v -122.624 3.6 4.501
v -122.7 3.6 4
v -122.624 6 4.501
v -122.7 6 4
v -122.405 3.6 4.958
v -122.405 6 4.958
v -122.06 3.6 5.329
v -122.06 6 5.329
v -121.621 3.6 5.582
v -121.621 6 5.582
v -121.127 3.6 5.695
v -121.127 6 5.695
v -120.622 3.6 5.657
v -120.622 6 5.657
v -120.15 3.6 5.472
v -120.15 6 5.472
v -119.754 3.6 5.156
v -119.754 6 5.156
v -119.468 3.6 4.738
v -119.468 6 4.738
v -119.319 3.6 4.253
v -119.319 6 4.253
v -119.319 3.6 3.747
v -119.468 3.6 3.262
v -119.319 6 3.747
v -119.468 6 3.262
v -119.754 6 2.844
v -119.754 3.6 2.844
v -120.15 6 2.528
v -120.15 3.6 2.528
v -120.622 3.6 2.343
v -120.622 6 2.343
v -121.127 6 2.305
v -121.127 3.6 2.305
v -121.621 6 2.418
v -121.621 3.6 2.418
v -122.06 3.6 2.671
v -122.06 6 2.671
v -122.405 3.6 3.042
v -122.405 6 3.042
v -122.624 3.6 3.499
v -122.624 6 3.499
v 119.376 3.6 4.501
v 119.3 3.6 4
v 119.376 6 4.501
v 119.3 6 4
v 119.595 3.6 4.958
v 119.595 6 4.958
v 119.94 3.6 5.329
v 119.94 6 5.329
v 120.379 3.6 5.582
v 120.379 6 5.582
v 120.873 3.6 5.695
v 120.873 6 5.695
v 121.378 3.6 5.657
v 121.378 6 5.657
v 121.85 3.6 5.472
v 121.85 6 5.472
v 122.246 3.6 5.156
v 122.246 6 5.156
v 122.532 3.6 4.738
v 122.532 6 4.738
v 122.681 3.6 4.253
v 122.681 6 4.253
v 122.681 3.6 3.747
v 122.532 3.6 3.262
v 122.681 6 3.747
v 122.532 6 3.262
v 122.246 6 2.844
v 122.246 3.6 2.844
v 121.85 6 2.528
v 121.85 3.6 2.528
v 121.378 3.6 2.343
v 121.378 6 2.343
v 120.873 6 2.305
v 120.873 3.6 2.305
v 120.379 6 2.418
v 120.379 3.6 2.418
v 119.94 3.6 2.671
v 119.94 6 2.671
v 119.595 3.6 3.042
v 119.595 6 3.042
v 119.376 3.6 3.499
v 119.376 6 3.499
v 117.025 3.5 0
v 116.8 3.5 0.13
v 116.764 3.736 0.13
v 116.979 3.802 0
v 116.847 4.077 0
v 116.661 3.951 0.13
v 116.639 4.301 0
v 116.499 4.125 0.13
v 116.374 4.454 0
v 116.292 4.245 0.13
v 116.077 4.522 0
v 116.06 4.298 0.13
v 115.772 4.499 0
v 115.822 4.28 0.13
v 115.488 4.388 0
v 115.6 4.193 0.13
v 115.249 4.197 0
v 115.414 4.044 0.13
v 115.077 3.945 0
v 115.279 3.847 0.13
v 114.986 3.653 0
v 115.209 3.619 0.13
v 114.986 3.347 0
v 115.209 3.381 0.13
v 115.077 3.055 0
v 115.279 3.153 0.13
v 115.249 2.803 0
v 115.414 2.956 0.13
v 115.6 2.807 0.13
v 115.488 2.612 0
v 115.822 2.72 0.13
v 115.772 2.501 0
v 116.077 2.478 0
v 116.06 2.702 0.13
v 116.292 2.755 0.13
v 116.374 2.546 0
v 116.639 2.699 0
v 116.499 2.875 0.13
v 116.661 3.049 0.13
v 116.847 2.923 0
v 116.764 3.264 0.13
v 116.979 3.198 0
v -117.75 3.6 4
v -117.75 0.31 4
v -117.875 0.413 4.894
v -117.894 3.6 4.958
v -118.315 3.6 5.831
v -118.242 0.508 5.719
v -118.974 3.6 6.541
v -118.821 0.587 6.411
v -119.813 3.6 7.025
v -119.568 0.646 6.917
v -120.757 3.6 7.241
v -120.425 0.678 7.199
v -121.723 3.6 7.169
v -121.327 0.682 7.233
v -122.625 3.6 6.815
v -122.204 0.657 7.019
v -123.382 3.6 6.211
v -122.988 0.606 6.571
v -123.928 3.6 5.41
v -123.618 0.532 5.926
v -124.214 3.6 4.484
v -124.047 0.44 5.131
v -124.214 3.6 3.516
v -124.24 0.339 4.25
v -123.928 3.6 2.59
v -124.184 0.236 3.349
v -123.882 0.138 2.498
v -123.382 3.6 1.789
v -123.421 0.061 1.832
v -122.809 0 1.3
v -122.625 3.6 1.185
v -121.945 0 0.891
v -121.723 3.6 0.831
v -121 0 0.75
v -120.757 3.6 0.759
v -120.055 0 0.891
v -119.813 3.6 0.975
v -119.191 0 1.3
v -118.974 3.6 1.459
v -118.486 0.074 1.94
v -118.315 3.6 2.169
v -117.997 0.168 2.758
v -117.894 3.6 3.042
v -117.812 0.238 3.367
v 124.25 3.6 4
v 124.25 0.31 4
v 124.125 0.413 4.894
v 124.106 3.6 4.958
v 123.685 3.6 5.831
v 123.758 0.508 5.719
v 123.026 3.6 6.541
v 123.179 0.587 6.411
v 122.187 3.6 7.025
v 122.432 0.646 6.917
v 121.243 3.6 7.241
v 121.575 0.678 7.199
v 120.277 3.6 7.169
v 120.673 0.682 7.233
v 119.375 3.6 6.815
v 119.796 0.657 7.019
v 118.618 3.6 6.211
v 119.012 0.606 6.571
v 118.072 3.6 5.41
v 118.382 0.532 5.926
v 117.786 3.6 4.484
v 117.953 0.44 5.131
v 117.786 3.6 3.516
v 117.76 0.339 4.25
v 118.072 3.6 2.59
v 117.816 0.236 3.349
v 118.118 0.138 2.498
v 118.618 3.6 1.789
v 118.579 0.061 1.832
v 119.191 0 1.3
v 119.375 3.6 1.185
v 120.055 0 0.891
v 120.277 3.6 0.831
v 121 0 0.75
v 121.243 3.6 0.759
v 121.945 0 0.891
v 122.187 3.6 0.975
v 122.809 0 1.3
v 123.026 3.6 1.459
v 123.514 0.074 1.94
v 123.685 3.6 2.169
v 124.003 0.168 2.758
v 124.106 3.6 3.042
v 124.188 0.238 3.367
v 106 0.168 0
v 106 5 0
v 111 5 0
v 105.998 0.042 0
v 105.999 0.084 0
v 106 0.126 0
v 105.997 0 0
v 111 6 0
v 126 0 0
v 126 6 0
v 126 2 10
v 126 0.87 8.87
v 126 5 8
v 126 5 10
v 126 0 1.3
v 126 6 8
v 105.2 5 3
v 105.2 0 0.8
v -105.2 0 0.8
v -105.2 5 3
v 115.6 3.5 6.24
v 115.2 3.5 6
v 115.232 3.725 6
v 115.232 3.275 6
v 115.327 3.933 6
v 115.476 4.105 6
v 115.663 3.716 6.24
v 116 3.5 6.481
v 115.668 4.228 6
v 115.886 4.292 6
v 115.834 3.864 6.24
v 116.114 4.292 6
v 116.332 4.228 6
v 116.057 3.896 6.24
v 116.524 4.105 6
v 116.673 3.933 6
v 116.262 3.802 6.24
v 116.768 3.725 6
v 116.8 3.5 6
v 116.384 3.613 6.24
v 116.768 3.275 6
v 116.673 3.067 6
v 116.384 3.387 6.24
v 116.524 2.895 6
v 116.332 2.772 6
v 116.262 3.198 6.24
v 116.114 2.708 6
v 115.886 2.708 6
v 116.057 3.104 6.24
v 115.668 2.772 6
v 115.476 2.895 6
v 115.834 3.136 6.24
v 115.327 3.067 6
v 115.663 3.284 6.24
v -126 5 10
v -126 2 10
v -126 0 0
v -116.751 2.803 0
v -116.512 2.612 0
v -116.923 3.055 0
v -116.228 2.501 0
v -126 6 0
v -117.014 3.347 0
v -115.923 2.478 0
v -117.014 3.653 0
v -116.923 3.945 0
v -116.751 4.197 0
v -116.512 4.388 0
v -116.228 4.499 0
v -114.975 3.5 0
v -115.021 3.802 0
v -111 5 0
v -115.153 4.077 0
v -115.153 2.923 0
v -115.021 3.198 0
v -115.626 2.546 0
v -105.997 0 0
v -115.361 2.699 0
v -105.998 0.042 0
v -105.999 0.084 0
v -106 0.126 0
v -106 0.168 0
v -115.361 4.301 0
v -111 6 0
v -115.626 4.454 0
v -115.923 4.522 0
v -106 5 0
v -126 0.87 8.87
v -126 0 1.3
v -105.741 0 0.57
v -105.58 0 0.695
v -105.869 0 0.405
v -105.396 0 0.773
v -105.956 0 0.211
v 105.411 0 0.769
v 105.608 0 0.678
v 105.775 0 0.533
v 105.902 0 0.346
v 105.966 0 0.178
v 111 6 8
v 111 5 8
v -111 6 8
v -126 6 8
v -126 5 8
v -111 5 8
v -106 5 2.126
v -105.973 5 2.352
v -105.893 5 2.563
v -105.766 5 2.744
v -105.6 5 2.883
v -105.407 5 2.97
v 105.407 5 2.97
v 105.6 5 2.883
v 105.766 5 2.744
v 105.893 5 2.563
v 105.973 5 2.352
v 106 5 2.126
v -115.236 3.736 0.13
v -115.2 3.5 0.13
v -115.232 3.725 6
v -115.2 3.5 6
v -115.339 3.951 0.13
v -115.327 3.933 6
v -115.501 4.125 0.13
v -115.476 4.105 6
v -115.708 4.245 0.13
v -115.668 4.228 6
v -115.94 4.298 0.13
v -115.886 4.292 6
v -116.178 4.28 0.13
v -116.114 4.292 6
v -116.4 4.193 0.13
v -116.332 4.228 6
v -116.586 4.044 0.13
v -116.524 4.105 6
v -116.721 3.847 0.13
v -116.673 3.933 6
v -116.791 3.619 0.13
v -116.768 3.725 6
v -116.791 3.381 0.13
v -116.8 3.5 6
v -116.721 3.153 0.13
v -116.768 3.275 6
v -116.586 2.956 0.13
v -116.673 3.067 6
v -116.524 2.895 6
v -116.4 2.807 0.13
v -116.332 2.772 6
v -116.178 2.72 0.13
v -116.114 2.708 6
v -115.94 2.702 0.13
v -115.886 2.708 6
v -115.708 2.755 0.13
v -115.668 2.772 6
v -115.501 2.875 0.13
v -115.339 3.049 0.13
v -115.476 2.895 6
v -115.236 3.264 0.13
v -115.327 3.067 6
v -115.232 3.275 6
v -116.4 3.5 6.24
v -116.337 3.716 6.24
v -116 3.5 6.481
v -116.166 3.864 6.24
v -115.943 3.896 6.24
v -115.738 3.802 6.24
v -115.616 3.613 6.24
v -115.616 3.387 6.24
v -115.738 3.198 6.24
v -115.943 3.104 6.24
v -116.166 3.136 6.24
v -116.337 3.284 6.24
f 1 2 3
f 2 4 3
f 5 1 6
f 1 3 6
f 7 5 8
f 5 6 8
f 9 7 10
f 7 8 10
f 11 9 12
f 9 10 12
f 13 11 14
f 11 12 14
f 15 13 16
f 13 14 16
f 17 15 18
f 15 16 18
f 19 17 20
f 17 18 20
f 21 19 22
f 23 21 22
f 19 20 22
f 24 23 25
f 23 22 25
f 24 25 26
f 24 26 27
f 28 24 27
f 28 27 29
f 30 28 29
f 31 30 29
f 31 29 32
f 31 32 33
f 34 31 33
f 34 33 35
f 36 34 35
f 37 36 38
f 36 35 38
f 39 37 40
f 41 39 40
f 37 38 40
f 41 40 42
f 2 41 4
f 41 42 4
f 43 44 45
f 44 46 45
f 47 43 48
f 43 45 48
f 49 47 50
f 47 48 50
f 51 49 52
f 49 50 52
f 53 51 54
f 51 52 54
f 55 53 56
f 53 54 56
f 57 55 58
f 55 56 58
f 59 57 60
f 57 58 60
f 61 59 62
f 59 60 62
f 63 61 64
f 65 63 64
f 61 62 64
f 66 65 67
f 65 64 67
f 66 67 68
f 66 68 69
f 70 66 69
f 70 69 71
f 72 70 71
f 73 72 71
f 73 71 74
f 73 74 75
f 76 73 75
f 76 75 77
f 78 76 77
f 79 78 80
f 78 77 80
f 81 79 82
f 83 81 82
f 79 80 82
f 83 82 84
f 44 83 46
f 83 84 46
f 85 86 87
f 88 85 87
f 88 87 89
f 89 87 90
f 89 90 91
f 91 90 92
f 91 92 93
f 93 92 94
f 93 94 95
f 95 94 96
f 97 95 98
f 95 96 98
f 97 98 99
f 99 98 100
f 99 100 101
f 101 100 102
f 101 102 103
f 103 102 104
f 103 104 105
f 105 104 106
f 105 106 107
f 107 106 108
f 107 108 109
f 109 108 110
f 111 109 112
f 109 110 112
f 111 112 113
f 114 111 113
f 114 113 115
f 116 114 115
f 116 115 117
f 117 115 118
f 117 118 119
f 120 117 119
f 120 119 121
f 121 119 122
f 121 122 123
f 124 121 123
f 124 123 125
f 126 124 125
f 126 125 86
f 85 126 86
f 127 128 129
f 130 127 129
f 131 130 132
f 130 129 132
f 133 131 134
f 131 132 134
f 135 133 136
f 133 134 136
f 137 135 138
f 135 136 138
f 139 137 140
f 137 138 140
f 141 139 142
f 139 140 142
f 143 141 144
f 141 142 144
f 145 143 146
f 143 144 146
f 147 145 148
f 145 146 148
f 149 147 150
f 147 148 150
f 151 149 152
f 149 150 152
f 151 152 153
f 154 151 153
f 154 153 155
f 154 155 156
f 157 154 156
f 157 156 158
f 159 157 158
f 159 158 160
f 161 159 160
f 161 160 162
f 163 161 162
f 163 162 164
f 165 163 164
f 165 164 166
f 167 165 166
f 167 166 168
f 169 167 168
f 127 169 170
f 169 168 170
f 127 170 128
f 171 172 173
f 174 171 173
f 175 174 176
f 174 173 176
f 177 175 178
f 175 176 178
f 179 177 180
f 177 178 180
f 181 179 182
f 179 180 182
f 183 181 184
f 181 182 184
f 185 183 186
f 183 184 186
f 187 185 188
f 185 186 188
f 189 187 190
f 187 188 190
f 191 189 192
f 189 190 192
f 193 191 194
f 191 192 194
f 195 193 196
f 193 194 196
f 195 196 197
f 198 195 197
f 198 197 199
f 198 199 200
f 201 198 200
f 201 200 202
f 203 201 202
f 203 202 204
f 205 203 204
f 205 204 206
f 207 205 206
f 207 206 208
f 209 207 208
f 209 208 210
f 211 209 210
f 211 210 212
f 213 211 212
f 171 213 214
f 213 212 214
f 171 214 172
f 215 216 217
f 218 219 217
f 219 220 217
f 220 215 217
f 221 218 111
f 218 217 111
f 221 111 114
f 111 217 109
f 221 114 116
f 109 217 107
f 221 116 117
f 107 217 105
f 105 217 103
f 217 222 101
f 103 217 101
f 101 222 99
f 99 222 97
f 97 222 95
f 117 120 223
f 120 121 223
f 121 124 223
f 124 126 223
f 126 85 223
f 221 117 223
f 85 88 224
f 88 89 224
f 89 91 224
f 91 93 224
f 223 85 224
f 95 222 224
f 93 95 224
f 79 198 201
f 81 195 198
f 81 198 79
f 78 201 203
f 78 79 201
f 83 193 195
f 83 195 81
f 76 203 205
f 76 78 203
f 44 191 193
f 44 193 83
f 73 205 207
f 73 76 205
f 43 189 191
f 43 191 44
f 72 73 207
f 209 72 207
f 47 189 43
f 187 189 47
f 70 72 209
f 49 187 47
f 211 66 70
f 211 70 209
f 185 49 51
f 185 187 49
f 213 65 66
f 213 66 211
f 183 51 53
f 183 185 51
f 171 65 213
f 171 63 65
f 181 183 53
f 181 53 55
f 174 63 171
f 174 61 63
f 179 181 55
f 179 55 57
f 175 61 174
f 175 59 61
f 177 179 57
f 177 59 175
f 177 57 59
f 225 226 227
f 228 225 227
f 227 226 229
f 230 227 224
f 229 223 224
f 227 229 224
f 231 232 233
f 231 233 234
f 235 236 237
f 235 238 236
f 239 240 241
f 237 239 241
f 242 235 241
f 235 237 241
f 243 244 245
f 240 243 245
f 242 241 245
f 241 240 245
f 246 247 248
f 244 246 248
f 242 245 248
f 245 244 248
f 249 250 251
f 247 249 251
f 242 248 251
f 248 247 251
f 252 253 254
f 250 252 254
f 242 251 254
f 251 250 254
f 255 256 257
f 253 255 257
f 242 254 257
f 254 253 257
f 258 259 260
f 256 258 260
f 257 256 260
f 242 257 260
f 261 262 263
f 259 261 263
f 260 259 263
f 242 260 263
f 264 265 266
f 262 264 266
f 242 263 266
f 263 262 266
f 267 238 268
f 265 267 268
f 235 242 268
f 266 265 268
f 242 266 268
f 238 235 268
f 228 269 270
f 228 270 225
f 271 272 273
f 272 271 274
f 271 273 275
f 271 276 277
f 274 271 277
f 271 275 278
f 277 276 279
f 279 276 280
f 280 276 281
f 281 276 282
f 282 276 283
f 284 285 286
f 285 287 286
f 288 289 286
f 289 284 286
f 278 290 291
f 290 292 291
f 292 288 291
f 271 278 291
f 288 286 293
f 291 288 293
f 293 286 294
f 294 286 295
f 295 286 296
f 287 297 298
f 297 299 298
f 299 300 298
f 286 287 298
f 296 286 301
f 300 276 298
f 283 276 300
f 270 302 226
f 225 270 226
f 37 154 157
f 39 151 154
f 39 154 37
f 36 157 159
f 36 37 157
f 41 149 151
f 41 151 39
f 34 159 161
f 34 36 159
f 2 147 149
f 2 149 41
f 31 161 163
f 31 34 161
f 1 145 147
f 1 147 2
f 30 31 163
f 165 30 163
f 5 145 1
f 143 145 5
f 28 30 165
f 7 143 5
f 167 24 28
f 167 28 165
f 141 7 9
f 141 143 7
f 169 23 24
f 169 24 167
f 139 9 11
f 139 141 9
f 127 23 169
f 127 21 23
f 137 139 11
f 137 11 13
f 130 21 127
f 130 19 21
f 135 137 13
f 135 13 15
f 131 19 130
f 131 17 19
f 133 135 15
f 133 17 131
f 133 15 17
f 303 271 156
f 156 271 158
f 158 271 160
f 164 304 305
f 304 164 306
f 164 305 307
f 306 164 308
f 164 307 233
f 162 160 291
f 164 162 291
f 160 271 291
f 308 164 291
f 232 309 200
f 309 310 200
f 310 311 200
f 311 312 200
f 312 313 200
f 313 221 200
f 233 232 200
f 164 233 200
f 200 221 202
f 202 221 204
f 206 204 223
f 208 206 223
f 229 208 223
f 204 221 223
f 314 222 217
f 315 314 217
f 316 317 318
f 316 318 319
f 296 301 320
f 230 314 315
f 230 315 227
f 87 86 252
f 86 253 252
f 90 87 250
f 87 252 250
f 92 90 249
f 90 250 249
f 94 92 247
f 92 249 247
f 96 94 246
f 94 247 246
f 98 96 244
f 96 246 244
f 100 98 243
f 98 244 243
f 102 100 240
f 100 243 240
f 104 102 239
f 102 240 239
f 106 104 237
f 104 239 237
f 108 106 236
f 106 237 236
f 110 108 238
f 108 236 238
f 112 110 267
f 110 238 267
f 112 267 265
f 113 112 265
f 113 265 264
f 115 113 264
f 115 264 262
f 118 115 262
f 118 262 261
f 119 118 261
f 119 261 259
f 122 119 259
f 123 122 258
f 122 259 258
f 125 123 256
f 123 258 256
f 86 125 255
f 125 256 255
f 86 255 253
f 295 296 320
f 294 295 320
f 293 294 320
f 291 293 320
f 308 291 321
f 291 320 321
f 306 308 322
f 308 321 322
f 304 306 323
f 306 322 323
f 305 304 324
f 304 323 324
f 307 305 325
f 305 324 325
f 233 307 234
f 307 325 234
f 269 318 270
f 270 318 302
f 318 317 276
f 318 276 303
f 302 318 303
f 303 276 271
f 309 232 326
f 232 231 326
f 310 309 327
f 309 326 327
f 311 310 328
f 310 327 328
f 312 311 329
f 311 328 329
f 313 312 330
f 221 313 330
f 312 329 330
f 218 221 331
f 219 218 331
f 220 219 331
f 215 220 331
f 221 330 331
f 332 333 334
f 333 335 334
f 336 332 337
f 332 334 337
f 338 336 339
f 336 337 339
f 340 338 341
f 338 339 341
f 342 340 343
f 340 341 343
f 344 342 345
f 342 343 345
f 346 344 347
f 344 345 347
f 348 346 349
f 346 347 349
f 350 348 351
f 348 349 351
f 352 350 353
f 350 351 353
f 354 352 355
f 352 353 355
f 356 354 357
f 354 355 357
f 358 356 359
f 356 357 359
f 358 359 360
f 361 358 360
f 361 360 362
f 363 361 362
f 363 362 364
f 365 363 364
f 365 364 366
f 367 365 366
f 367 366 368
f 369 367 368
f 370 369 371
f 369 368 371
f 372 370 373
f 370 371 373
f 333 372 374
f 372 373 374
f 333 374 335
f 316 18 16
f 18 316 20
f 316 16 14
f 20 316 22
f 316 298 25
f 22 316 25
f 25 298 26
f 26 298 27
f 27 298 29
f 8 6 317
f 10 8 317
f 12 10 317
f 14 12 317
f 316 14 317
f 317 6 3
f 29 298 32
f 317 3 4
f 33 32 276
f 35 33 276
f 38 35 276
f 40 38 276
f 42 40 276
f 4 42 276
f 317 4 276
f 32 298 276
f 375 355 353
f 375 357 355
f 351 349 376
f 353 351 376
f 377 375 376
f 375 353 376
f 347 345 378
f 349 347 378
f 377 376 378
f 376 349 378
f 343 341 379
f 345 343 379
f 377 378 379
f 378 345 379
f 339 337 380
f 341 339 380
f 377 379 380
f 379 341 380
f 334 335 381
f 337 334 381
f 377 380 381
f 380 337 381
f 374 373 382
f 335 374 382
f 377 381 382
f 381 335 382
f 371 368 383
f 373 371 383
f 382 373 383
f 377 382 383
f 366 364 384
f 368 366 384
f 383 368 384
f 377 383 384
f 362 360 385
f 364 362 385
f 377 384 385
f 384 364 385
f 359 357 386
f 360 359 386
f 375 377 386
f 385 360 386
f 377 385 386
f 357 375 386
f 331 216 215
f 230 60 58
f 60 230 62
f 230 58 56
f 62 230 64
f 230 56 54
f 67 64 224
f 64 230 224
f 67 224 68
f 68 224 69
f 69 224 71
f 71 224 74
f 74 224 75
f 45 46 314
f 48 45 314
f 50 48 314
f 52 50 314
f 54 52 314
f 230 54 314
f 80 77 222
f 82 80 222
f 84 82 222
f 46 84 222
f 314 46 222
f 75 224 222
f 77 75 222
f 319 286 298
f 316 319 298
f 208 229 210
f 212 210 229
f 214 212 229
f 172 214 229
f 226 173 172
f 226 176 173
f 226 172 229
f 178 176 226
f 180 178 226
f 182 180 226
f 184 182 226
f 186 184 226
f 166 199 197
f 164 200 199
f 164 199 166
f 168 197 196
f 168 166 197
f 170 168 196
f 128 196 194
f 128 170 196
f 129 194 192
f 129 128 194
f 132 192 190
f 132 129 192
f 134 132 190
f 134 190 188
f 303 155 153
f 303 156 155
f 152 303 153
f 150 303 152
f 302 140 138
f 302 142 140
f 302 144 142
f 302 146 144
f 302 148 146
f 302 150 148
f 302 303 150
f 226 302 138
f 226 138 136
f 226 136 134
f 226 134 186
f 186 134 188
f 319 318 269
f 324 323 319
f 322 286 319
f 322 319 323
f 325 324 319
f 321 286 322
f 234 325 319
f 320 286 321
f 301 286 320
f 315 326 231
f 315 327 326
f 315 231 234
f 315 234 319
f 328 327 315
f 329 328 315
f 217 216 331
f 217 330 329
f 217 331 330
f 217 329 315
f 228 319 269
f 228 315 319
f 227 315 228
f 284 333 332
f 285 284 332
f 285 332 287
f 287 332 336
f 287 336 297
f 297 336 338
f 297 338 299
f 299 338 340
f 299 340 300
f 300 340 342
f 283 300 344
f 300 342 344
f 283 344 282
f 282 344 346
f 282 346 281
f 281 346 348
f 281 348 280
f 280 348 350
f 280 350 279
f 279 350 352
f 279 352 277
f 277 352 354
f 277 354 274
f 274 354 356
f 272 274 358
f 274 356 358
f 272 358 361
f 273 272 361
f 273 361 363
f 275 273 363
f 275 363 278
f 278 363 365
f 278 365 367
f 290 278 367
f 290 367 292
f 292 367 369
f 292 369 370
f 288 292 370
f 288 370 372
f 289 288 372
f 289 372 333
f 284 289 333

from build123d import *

# Parameters (mm, degrees)
EXTRUDE_1_DEPTH             = 10
CUT_EXTRUDE_1_DEPTH         = 106
FILLET_1_R                  = 0.8
CUT_EXTRUDE_2_DEPTH         = 253.269696951
CHAMFER_1_SIZE              = 1
CHAMFER_1_SIZE2             = 1.137309439
SKETCH_7_W                  = 15
SKETCH_7_H                  = 2
CUT_EXTRUDE_3_DEPTH         = 1
HOLE_WIZARD_M21_D           = 1.6
HOLE_WIZARD_M21_DEPTH       = 6
HOLE_WIZARD_M21_CSINK_D     = 2.05
HOLE_WIZARD_M21_CSINK_ANGLE = 120
HOLE_WIZARD_M21_TIP         = 0.480688495
HOLE_WIZARD_M31_D           = 3.4
HOLE_WIZARD_M31_CBORE_D     = 6.5
HOLE_WIZARD_M31_CBORE_DEPTH = 3.6


with BuildPart() as part:
    # Эскиз1 → Бобышка-Вытянуть1 (new body)
    with BuildSketch(Plane.XY):
        Polygon((-126, 0), (126, 0), (126, 6), (111, 6), (111, 5), (-111, 5), (-111, 6), (-126, 6), align=None)
    extrude(amount=EXTRUDE_1_DEPTH)

    # Эскиз5 → Вырез-Вытянуть1 (cut, symmetric)
    with BuildSketch(Plane(origin=(0, 0, 0), x_dir=(0, 0, -1), z_dir=(1, 0, 0))):
        Polygon((0, 0), (-0.8, 0), (-3, 5), (0, 5), align=None)
    extrude(amount=CUT_EXTRUDE_1_DEPTH, both=True, mode=Mode.SUBTRACT)

    # Скругление1
    fillet_1_edges = [part.edges().sort_by_distance(p)[0] for p in [
        (-106, 2.5, 1.9),
        (106, 2.5, 1.9),
    ]]
    fillet(fillet_1_edges, radius=FILLET_1_R)

    # Эскиз6 → Вырез-Вытянуть2 (cut, through all)
    with BuildSketch(Plane.ZY.offset(126)):
        Polygon((1.3, 0), (10, 1), (10, 0), align=None)
    extrude(amount=-CUT_EXTRUDE_2_DEPTH, mode=Mode.SUBTRACT)

    # Фаска1
    chamfer_1_edges = [part.edges().sort_by_distance(p)[0] for p in [
        (0, 1, 10),
    ]]
    chamfer_1_side = [part.faces().sort_by_distance(p)[0] for p in [
        (0, 3.072254335, 10),
    ]]
    chamfer(chamfer_1_edges, length=CHAMFER_1_SIZE, length2=CHAMFER_1_SIZE2, reference=chamfer_1_side[0])

    # Эскиз7 → Вырез-Вытянуть3 (cut)
    with BuildSketch(Plane(origin=(0, 6, 0), x_dir=(1, 0, 0), z_dir=(0, 1, 0))):
        with Locations((-118.5, -9)):
            Rectangle(SKETCH_7_W, SKETCH_7_H)
        with Locations((118.5, -9)):
            Rectangle(SKETCH_7_W, SKETCH_7_H)
    extrude(amount=-CUT_EXTRUDE_3_DEPTH, mode=Mode.SUBTRACT)

    # Отверстие обработанное метчиком M21
    with Locations(Plane(origin=(0, 0, 0), x_dir=(-1, 0, 0), z_dir=(0, 0, -1))):
        with Locations((-116, 3.5), (116, 3.5)):
            CounterSinkHole(HOLE_WIZARD_M21_D / 2, HOLE_WIZARD_M21_CSINK_D / 2, depth=HOLE_WIZARD_M21_DEPTH, counter_sink_angle=HOLE_WIZARD_M21_CSINK_ANGLE)
            with Locations((0, 0, -(HOLE_WIZARD_M21_DEPTH + HOLE_WIZARD_M21_TIP / 2))):  # 118° drill point
                Cone(0, HOLE_WIZARD_M21_D / 2, HOLE_WIZARD_M21_TIP, mode=Mode.SUBTRACT)

    # Цековка для  винта с внутренним шестигранником M31 (through all)
    with Locations(Plane.XZ):
        with Locations((121, 4), (-121, 4)):
            CounterBoreHole(HOLE_WIZARD_M31_D / 2, HOLE_WIZARD_M31_CBORE_D / 2, HOLE_WIZARD_M31_CBORE_DEPTH)


solid = part.part
